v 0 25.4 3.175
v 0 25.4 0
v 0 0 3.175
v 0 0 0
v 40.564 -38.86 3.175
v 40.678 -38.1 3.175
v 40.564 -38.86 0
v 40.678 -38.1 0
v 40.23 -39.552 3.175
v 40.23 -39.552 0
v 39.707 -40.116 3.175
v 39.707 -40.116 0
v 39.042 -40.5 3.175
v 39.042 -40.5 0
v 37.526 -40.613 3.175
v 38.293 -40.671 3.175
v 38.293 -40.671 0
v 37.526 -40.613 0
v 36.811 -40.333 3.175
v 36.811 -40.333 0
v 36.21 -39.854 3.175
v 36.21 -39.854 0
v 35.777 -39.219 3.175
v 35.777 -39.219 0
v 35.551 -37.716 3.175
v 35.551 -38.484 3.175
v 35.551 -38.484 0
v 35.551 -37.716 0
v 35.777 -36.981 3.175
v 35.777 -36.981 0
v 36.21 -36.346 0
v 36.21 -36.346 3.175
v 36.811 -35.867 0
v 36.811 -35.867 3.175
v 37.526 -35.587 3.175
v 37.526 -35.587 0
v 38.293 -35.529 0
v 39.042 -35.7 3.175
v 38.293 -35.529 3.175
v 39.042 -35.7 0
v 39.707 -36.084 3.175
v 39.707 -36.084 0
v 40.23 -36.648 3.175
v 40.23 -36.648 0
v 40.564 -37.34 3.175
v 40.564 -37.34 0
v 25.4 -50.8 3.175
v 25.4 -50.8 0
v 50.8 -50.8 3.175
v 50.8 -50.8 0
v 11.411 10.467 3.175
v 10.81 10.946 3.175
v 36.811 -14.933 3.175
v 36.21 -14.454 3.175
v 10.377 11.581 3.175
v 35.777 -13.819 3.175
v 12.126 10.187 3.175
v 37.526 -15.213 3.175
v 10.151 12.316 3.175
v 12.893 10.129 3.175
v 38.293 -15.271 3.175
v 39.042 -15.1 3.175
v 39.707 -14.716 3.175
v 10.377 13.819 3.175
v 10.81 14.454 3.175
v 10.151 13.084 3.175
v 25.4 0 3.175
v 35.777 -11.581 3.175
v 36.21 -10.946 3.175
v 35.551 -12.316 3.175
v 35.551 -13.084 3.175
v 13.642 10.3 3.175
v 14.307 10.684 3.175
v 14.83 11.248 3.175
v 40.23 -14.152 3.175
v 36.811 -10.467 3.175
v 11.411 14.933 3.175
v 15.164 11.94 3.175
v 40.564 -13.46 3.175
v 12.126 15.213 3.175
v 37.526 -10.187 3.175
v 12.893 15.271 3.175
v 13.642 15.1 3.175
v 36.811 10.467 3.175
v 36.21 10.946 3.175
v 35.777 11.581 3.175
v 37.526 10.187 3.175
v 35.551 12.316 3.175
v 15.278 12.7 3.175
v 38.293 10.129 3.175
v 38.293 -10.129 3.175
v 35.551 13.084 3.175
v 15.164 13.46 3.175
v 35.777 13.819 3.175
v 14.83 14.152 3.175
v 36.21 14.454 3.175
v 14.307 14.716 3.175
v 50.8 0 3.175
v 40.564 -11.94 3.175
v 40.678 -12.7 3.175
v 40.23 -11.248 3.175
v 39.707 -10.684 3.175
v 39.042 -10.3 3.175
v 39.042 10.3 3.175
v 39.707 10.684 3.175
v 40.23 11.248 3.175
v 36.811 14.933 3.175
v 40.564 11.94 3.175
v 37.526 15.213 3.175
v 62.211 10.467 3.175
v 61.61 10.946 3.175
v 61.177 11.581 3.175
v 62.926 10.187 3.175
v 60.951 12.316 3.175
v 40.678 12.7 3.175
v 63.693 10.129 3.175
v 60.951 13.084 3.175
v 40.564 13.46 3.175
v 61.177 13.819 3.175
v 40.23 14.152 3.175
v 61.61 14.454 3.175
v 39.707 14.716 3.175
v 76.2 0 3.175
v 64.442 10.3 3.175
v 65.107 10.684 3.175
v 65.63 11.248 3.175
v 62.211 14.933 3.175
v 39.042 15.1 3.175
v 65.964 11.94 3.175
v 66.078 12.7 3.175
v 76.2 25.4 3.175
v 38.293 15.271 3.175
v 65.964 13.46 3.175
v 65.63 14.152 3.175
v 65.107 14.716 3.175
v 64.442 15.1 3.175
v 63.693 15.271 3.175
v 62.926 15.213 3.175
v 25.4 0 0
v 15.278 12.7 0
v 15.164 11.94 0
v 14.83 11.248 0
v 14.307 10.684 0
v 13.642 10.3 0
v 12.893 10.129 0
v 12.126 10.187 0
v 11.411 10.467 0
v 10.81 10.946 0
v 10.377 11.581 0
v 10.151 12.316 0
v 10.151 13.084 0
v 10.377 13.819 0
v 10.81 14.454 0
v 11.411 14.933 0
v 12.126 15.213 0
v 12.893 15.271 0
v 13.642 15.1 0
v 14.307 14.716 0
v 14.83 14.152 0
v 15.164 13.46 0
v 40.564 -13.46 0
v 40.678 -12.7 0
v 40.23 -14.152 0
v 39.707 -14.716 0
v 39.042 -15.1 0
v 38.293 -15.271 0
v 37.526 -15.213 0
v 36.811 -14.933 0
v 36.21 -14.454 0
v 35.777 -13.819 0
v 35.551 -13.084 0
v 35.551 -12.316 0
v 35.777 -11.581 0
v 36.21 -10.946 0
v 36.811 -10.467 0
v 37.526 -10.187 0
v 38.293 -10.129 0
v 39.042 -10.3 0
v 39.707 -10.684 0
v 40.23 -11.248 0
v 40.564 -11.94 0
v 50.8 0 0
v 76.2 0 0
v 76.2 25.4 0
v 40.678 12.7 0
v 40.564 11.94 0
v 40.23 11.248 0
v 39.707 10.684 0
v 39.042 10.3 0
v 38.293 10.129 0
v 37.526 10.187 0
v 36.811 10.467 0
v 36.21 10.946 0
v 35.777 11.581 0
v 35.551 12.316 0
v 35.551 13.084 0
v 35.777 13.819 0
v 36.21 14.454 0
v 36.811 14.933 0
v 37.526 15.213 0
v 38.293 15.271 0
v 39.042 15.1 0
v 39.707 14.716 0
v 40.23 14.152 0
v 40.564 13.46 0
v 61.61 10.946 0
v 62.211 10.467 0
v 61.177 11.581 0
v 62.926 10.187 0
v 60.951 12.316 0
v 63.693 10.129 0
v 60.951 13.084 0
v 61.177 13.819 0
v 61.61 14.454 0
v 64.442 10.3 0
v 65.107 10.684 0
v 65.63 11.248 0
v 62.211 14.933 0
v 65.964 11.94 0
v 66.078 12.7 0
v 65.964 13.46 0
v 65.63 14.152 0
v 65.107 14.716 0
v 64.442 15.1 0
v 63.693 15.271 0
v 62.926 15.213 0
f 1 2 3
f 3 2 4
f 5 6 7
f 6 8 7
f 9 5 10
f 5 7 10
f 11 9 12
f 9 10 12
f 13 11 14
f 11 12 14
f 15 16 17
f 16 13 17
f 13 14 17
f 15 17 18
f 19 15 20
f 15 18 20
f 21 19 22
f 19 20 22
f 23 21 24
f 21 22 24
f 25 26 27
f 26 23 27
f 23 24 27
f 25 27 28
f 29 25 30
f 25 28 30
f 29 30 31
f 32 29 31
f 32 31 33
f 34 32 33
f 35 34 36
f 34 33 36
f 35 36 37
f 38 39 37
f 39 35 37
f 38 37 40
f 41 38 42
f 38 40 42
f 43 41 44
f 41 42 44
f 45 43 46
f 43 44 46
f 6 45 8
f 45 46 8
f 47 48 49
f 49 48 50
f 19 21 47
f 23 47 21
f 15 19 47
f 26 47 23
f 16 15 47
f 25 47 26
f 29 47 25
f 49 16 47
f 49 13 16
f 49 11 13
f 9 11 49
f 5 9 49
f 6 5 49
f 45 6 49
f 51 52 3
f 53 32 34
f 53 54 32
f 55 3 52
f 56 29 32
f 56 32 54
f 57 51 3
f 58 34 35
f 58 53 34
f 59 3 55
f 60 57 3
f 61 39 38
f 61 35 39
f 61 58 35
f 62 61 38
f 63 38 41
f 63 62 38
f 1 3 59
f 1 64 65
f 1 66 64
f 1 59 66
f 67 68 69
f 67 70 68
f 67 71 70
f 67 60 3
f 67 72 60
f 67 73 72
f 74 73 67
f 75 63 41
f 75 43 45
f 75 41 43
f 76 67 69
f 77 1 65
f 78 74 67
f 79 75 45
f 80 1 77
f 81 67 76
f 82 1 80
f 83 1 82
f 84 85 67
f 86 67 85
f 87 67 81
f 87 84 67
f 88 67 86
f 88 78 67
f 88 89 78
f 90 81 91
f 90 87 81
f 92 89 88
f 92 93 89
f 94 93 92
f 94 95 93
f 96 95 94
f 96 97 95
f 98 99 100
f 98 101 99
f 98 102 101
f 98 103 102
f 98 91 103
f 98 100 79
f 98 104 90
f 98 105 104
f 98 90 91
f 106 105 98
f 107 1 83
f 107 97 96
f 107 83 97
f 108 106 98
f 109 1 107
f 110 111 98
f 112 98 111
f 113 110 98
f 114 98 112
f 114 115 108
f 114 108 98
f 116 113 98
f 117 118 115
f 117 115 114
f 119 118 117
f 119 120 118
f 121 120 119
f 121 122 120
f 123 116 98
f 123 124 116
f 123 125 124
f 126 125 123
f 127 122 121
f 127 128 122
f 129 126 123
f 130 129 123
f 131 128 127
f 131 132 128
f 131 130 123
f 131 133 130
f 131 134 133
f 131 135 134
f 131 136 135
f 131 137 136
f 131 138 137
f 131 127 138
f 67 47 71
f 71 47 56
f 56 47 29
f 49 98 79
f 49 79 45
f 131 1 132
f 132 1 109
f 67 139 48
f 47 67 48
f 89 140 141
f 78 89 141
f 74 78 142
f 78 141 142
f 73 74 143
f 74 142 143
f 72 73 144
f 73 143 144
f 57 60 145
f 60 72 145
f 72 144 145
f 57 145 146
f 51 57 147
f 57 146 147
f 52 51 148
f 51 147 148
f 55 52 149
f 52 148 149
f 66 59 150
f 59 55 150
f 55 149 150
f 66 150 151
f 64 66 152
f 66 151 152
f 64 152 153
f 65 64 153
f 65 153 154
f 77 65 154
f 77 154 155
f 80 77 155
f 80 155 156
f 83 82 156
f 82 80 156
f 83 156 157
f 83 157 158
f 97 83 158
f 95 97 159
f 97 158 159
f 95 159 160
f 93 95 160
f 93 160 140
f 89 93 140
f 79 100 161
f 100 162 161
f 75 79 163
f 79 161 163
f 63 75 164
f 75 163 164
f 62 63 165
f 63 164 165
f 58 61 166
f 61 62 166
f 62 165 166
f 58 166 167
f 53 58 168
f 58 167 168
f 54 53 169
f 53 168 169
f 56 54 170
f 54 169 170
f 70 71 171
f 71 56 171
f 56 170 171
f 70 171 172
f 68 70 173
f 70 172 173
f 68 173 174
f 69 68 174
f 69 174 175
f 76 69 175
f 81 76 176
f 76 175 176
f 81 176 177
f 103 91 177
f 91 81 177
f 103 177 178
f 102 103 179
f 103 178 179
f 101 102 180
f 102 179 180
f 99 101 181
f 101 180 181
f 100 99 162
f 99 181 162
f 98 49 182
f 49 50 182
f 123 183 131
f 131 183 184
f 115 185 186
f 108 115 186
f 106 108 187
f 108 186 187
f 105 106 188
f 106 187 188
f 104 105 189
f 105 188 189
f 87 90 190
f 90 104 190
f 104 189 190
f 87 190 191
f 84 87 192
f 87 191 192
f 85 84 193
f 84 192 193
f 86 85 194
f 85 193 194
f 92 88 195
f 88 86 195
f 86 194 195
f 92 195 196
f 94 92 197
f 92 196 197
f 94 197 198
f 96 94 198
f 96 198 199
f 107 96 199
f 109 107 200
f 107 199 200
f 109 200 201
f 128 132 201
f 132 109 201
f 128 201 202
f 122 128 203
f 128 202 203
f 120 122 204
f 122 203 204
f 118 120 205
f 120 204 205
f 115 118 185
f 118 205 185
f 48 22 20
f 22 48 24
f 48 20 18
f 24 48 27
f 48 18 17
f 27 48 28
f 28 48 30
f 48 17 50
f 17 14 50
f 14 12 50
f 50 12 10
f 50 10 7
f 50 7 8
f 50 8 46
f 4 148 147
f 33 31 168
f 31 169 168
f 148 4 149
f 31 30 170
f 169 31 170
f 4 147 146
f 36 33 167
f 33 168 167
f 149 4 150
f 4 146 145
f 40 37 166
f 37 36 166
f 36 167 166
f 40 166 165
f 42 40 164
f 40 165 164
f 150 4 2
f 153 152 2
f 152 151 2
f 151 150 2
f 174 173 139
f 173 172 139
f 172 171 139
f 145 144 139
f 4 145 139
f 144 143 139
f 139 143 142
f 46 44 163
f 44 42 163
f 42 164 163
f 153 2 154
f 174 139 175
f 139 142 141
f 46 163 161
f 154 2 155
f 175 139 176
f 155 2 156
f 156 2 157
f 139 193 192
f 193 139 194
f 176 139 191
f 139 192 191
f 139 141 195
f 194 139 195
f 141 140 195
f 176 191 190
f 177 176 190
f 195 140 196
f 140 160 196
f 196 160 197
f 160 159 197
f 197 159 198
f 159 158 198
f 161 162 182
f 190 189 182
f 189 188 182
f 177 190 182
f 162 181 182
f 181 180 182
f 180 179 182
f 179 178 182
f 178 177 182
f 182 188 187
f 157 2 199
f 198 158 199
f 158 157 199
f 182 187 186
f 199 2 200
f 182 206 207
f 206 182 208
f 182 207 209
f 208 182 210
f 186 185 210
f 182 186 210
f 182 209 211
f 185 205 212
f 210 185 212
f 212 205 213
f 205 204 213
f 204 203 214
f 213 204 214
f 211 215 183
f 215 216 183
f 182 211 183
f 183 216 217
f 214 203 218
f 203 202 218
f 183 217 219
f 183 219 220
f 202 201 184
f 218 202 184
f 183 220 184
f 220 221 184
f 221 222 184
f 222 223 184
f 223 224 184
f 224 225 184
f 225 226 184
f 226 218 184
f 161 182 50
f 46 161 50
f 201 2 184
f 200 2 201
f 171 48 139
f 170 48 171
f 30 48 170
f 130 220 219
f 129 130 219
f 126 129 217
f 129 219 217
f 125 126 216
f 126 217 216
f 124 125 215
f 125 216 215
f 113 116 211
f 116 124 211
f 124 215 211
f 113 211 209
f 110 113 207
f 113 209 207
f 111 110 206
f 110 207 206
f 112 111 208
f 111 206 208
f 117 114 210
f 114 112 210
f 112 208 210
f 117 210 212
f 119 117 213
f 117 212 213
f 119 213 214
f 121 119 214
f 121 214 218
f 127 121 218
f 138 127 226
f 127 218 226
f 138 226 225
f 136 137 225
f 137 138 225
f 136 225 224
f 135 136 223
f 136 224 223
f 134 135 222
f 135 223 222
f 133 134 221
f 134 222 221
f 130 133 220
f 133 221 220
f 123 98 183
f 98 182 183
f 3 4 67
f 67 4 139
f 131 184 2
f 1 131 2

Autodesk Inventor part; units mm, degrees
ref_plane "YZ Plane" through (0, 0, 0) normal (1, 0, 0) x (0, 1, 0)
ref_plane "XZ Plane" through (0, 0, 0) normal (0, 1, 0) x (-1, 0, 0)
ref_plane "XY Plane" through (0, 0, 0) normal (0, 0, 1) x (1, 0, 0)
sketch "Sketch1" plane through (0, 0, 0) normal (0, 0, 1) x (1, 0, 0)
  line L0 (76.2, 0) -> (76.2, 25.4)
  line L1 (76.2, 25.4) -> (0, 25.4)
  line L2 (0, 25.4) -> (0, 0)
  line L3 (0, 0) -> (25.4, 0) construction
  line L4 (25.4, 0) -> (25.4, -50.8)
  line L5 (25.4, -50.8) -> (50.8, -50.8)
  line L6 (50.8, -50.8) -> (50.8, 0)
  line L7 (0, 0) -> (25.4, 0)
  line L8 (50.8, 0) -> (76.2, 0)
  line L9 (0, 12.7) -> (12.7, 12.7) construction
  line L10 (12.7, 12.7) -> (38.1, 12.7) construction
  line L11 (38.1, 12.7) -> (63.5, 12.7) construction
  line L12 (38.1, 12.7) -> (38.1, -12.7) construction
  line L13 (38.1, -12.7) -> (38.1, -38.1) construction
  circle A0 centre (12.7, 12.7) radius 2.5781
  circle A1 centre (38.1, 12.7) radius 2.5781
  circle A2 centre (63.5, 12.7) radius 2.5781
  circle A3 centre (38.1, -12.7) radius 2.5781
  circle A4 centre (38.1, -38.1) radius 2.5781
  dimension "d0" = 76.2
  dimension "d1" = 25.4
  dimension "d2" = 25.4
  dimension "d3" = 50.8
  dimension "d4" = 25.4
  dimension "d5" = 25.4
  dimension "d6" = 25.4
  dimension "d7" = 5.1562
extrude "Extrusion1" add sketch "Sketch1" along normal blind 3.175
properties part number "T-Gusset"
